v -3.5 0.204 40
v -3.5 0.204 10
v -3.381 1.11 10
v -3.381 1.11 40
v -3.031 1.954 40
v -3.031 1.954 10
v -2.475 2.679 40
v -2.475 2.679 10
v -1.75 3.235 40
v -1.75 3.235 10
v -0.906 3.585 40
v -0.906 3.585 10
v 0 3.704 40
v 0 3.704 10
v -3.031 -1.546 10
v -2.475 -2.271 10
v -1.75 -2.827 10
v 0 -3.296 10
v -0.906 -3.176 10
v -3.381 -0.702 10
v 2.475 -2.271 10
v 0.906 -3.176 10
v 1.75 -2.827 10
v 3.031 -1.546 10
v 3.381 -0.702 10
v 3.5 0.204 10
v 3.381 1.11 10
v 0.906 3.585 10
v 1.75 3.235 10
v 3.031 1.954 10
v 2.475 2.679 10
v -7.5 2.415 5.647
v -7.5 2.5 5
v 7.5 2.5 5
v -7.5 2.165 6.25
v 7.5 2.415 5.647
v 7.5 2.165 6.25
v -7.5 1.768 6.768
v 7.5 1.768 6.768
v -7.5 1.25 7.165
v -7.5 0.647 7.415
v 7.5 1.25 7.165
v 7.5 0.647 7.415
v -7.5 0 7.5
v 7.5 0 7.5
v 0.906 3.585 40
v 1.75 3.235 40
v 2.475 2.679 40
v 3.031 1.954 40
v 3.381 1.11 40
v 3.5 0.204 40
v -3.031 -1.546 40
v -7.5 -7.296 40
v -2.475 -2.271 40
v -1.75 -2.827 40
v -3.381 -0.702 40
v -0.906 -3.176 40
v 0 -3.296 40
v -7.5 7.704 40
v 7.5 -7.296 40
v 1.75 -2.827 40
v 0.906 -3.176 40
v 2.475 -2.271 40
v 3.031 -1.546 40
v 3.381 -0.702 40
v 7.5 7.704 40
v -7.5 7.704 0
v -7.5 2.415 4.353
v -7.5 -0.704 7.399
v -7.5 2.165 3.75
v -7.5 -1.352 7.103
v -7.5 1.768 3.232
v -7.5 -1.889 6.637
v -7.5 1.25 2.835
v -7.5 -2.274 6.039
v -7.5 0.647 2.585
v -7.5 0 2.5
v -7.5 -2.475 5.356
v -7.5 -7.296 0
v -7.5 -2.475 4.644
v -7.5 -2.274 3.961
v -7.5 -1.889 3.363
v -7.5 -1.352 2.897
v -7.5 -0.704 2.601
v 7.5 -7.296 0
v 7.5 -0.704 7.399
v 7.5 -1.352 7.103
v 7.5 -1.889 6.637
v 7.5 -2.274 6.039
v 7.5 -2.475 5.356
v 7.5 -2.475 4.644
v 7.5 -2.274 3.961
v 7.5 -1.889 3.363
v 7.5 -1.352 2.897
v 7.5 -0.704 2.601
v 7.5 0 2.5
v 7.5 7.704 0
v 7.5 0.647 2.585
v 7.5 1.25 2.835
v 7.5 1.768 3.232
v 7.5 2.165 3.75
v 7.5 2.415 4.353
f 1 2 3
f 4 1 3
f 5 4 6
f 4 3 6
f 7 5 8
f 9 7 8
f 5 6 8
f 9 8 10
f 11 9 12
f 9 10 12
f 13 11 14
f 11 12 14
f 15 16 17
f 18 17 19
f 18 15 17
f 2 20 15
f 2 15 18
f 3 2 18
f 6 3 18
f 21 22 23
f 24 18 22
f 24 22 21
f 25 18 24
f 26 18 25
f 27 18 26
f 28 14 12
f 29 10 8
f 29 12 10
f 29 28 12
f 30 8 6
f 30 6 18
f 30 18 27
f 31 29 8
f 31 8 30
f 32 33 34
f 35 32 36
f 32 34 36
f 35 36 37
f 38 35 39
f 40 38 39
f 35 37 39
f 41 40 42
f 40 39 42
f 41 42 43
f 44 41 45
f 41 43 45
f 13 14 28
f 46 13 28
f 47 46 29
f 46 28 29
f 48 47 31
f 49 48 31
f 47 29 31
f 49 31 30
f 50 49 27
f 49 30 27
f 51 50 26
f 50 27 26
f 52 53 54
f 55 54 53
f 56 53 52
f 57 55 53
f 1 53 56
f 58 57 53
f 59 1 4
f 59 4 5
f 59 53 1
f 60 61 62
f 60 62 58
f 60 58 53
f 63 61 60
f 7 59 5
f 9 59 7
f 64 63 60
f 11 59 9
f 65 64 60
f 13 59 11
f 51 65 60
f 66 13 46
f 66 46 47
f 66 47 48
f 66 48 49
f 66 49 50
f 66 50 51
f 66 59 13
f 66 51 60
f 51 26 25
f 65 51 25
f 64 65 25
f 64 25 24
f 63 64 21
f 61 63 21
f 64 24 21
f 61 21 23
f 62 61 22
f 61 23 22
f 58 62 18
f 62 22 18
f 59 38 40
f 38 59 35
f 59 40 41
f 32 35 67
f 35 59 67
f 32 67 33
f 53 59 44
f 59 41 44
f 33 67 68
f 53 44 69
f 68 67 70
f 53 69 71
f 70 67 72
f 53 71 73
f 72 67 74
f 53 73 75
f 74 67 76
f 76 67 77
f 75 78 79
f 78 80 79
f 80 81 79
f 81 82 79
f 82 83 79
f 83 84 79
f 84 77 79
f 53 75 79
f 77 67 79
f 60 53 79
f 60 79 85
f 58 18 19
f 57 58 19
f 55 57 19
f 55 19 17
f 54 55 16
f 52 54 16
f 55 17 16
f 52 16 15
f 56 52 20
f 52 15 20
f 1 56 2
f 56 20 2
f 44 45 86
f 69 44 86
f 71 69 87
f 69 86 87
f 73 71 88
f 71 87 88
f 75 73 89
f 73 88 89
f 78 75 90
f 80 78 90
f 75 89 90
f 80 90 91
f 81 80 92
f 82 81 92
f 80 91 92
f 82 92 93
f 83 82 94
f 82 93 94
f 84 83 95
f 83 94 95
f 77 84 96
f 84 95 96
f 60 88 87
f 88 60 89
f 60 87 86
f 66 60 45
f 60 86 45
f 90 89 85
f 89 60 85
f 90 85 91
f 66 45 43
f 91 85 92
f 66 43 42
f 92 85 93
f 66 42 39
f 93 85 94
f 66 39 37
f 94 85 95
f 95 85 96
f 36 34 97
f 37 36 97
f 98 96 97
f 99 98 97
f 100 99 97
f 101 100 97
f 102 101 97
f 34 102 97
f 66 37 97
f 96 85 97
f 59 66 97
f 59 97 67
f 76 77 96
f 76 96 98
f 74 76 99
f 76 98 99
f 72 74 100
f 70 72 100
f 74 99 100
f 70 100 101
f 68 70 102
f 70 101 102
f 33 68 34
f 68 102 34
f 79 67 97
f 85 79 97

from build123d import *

# Parameters (mm, degrees)
F1_DEPTH = 10
F2_DEPTH = 40
F4_DEPTH = 15


with BuildPart() as f1:
    # F0 (on Top) → F1 (new body)
    with BuildSketch(Plane.XY):
        with BuildLine():
            Line((7.5, 7.7042555064), (0, 7.7042555064))
            Line((0, 7.7042555064), (0, 3.7042555064))
            ThreePointArc((0, 3.7042555064), (2.4748737342, 2.6791292405), (3.5, 0.2042555064))
            Line((3.5, 0.2042555064), (7.5, 0.2042555064))
            Line((7.5, 0.2042555064), (7.5, 7.7042555064))
        make_face()
        with BuildLine():
            Line((0, 7.7042555064), (-7.5, 7.7042555064))
            Line((-7.5, 7.7042555064), (-7.5, 0.2042555064))
            Line((-7.5, 0.2042555064), (-3.5, 0.2042555064))
            ThreePointArc((-3.5, 0.2042555064), (-2.4748737342, 2.6791292405), (0, 3.7042555064))
            Line((0, 3.7042555064), (0, 7.7042555064))
        make_face()
        with BuildLine():
            Line((-3.5, 0.2042555064), (-7.5, 0.2042555064))
            Line((-7.5, 0.2042555064), (-7.5, -7.2957444936))
            Line((-7.5, -7.2957444936), (0, -7.2957444936))
            Line((0, -7.2957444936), (0, -3.2957444936))
            ThreePointArc((0, -3.2957444936), (-2.4748737342, -2.2706182278), (-3.5, 0.2042555064))
        make_face()
        with BuildLine():
            Line((7.5, -7.2957444936), (7.5, 0.2042555064))
            Line((7.5, 0.2042555064), (3.5, 0.2042555064))
            ThreePointArc((3.5, 0.2042555064), (2.4748737342, -2.2706182278), (0, -3.2957444936))
            Line((0, -3.2957444936), (0, -7.2957444936))
            Line((0, -7.2957444936), (7.5, -7.2957444936))
        make_face()
        with BuildLine():
            Line((0, 0.2042555064), (0, 3.7042555064))
            ThreePointArc((0, 3.7042555064), (-2.4748737342, 2.6791292405), (-3.5, 0.2042555064))
            Line((-3.5, 0.2042555064), (0, 0.2042555064))
        make_face()
        with BuildLine():
            ThreePointArc((3.5, 0.2042555064), (2.4748737342, 2.6791292405), (0, 3.7042555064))
            Line((0, 3.7042555064), (0, 0.2042555064))
            Line((0, 0.2042555064), (3.5, 0.2042555064))
        make_face()
        with BuildLine():
            Line((3.5, 0.2042555064), (0, 0.2042555064))
            Line((0, 0.2042555064), (0, -3.2957444936))
            ThreePointArc((0, -3.2957444936), (2.4748737342, -2.2706182278), (3.5, 0.2042555064))
        make_face()
        with BuildLine():
            Line((0, 0.2042555064), (-3.5, 0.2042555064))
            ThreePointArc((-3.5, 0.2042555064), (-2.4748737342, -2.2706182278), (0, -3.2957444936))
            Line((0, -3.2957444936), (0, 0.2042555064))
        make_face()
    extrude(amount=F1_DEPTH)

    # F0 (on Top) → F2 (join)
    with BuildSketch(Plane.XY):
        with BuildLine():
            Line((0, 7.7042555064), (-7.5, 7.7042555064))
            Line((-7.5, 7.7042555064), (-7.5, 0.2042555064))
            Line((-7.5, 0.2042555064), (-3.5, 0.2042555064))
            ThreePointArc((-3.5, 0.2042555064), (-2.4748737342, 2.6791292405), (0, 3.7042555064))
            Line((0, 3.7042555064), (0, 7.7042555064))
        make_face()
        with BuildLine():
            Line((7.5, 7.7042555064), (0, 7.7042555064))
            Line((0, 7.7042555064), (0, 3.7042555064))
            ThreePointArc((0, 3.7042555064), (2.4748737342, 2.6791292405), (3.5, 0.2042555064))
            Line((3.5, 0.2042555064), (7.5, 0.2042555064))
            Line((7.5, 0.2042555064), (7.5, 7.7042555064))
        make_face()
        with BuildLine():
            Line((-3.5, 0.2042555064), (-7.5, 0.2042555064))
            Line((-7.5, 0.2042555064), (-7.5, -7.2957444936))
            Line((-7.5, -7.2957444936), (0, -7.2957444936))
            Line((0, -7.2957444936), (0, -3.2957444936))
            ThreePointArc((0, -3.2957444936), (-2.4748737342, -2.2706182278), (-3.5, 0.2042555064))
        make_face()
        with BuildLine():
            Line((7.5, -7.2957444936), (7.5, 0.2042555064))
            Line((7.5, 0.2042555064), (3.5, 0.2042555064))
            ThreePointArc((3.5, 0.2042555064), (2.4748737342, -2.2706182278), (0, -3.2957444936))
            Line((0, -3.2957444936), (0, -7.2957444936))
            Line((0, -7.2957444936), (7.5, -7.2957444936))
        make_face()
    extrude(amount=F2_DEPTH)

    # F3 (on face) → F4 (cut)
    with BuildSketch(Plane.YZ.offset(7.5)):
        with BuildLine():
            ThreePointArc((0, 7.5), (-2.5, 5), (0, 2.5))
            Line((0, 2.5), (0, 5))
            Line((0, 5), (0, 7.5))
        make_face()
        with BuildLine():
            Line((0, 5), (0, 2.5))
            ThreePointArc((0, 2.5), (1.767766953, 3.232233047), (2.5, 5))
            ThreePointArc((2.5, 5), (1.767766953, 6.767766953), (0, 7.5))
            Line((0, 7.5), (0, 5))
        make_face()
    extrude(amount=-F4_DEPTH, mode=Mode.SUBTRACT)


solid = f1.part
